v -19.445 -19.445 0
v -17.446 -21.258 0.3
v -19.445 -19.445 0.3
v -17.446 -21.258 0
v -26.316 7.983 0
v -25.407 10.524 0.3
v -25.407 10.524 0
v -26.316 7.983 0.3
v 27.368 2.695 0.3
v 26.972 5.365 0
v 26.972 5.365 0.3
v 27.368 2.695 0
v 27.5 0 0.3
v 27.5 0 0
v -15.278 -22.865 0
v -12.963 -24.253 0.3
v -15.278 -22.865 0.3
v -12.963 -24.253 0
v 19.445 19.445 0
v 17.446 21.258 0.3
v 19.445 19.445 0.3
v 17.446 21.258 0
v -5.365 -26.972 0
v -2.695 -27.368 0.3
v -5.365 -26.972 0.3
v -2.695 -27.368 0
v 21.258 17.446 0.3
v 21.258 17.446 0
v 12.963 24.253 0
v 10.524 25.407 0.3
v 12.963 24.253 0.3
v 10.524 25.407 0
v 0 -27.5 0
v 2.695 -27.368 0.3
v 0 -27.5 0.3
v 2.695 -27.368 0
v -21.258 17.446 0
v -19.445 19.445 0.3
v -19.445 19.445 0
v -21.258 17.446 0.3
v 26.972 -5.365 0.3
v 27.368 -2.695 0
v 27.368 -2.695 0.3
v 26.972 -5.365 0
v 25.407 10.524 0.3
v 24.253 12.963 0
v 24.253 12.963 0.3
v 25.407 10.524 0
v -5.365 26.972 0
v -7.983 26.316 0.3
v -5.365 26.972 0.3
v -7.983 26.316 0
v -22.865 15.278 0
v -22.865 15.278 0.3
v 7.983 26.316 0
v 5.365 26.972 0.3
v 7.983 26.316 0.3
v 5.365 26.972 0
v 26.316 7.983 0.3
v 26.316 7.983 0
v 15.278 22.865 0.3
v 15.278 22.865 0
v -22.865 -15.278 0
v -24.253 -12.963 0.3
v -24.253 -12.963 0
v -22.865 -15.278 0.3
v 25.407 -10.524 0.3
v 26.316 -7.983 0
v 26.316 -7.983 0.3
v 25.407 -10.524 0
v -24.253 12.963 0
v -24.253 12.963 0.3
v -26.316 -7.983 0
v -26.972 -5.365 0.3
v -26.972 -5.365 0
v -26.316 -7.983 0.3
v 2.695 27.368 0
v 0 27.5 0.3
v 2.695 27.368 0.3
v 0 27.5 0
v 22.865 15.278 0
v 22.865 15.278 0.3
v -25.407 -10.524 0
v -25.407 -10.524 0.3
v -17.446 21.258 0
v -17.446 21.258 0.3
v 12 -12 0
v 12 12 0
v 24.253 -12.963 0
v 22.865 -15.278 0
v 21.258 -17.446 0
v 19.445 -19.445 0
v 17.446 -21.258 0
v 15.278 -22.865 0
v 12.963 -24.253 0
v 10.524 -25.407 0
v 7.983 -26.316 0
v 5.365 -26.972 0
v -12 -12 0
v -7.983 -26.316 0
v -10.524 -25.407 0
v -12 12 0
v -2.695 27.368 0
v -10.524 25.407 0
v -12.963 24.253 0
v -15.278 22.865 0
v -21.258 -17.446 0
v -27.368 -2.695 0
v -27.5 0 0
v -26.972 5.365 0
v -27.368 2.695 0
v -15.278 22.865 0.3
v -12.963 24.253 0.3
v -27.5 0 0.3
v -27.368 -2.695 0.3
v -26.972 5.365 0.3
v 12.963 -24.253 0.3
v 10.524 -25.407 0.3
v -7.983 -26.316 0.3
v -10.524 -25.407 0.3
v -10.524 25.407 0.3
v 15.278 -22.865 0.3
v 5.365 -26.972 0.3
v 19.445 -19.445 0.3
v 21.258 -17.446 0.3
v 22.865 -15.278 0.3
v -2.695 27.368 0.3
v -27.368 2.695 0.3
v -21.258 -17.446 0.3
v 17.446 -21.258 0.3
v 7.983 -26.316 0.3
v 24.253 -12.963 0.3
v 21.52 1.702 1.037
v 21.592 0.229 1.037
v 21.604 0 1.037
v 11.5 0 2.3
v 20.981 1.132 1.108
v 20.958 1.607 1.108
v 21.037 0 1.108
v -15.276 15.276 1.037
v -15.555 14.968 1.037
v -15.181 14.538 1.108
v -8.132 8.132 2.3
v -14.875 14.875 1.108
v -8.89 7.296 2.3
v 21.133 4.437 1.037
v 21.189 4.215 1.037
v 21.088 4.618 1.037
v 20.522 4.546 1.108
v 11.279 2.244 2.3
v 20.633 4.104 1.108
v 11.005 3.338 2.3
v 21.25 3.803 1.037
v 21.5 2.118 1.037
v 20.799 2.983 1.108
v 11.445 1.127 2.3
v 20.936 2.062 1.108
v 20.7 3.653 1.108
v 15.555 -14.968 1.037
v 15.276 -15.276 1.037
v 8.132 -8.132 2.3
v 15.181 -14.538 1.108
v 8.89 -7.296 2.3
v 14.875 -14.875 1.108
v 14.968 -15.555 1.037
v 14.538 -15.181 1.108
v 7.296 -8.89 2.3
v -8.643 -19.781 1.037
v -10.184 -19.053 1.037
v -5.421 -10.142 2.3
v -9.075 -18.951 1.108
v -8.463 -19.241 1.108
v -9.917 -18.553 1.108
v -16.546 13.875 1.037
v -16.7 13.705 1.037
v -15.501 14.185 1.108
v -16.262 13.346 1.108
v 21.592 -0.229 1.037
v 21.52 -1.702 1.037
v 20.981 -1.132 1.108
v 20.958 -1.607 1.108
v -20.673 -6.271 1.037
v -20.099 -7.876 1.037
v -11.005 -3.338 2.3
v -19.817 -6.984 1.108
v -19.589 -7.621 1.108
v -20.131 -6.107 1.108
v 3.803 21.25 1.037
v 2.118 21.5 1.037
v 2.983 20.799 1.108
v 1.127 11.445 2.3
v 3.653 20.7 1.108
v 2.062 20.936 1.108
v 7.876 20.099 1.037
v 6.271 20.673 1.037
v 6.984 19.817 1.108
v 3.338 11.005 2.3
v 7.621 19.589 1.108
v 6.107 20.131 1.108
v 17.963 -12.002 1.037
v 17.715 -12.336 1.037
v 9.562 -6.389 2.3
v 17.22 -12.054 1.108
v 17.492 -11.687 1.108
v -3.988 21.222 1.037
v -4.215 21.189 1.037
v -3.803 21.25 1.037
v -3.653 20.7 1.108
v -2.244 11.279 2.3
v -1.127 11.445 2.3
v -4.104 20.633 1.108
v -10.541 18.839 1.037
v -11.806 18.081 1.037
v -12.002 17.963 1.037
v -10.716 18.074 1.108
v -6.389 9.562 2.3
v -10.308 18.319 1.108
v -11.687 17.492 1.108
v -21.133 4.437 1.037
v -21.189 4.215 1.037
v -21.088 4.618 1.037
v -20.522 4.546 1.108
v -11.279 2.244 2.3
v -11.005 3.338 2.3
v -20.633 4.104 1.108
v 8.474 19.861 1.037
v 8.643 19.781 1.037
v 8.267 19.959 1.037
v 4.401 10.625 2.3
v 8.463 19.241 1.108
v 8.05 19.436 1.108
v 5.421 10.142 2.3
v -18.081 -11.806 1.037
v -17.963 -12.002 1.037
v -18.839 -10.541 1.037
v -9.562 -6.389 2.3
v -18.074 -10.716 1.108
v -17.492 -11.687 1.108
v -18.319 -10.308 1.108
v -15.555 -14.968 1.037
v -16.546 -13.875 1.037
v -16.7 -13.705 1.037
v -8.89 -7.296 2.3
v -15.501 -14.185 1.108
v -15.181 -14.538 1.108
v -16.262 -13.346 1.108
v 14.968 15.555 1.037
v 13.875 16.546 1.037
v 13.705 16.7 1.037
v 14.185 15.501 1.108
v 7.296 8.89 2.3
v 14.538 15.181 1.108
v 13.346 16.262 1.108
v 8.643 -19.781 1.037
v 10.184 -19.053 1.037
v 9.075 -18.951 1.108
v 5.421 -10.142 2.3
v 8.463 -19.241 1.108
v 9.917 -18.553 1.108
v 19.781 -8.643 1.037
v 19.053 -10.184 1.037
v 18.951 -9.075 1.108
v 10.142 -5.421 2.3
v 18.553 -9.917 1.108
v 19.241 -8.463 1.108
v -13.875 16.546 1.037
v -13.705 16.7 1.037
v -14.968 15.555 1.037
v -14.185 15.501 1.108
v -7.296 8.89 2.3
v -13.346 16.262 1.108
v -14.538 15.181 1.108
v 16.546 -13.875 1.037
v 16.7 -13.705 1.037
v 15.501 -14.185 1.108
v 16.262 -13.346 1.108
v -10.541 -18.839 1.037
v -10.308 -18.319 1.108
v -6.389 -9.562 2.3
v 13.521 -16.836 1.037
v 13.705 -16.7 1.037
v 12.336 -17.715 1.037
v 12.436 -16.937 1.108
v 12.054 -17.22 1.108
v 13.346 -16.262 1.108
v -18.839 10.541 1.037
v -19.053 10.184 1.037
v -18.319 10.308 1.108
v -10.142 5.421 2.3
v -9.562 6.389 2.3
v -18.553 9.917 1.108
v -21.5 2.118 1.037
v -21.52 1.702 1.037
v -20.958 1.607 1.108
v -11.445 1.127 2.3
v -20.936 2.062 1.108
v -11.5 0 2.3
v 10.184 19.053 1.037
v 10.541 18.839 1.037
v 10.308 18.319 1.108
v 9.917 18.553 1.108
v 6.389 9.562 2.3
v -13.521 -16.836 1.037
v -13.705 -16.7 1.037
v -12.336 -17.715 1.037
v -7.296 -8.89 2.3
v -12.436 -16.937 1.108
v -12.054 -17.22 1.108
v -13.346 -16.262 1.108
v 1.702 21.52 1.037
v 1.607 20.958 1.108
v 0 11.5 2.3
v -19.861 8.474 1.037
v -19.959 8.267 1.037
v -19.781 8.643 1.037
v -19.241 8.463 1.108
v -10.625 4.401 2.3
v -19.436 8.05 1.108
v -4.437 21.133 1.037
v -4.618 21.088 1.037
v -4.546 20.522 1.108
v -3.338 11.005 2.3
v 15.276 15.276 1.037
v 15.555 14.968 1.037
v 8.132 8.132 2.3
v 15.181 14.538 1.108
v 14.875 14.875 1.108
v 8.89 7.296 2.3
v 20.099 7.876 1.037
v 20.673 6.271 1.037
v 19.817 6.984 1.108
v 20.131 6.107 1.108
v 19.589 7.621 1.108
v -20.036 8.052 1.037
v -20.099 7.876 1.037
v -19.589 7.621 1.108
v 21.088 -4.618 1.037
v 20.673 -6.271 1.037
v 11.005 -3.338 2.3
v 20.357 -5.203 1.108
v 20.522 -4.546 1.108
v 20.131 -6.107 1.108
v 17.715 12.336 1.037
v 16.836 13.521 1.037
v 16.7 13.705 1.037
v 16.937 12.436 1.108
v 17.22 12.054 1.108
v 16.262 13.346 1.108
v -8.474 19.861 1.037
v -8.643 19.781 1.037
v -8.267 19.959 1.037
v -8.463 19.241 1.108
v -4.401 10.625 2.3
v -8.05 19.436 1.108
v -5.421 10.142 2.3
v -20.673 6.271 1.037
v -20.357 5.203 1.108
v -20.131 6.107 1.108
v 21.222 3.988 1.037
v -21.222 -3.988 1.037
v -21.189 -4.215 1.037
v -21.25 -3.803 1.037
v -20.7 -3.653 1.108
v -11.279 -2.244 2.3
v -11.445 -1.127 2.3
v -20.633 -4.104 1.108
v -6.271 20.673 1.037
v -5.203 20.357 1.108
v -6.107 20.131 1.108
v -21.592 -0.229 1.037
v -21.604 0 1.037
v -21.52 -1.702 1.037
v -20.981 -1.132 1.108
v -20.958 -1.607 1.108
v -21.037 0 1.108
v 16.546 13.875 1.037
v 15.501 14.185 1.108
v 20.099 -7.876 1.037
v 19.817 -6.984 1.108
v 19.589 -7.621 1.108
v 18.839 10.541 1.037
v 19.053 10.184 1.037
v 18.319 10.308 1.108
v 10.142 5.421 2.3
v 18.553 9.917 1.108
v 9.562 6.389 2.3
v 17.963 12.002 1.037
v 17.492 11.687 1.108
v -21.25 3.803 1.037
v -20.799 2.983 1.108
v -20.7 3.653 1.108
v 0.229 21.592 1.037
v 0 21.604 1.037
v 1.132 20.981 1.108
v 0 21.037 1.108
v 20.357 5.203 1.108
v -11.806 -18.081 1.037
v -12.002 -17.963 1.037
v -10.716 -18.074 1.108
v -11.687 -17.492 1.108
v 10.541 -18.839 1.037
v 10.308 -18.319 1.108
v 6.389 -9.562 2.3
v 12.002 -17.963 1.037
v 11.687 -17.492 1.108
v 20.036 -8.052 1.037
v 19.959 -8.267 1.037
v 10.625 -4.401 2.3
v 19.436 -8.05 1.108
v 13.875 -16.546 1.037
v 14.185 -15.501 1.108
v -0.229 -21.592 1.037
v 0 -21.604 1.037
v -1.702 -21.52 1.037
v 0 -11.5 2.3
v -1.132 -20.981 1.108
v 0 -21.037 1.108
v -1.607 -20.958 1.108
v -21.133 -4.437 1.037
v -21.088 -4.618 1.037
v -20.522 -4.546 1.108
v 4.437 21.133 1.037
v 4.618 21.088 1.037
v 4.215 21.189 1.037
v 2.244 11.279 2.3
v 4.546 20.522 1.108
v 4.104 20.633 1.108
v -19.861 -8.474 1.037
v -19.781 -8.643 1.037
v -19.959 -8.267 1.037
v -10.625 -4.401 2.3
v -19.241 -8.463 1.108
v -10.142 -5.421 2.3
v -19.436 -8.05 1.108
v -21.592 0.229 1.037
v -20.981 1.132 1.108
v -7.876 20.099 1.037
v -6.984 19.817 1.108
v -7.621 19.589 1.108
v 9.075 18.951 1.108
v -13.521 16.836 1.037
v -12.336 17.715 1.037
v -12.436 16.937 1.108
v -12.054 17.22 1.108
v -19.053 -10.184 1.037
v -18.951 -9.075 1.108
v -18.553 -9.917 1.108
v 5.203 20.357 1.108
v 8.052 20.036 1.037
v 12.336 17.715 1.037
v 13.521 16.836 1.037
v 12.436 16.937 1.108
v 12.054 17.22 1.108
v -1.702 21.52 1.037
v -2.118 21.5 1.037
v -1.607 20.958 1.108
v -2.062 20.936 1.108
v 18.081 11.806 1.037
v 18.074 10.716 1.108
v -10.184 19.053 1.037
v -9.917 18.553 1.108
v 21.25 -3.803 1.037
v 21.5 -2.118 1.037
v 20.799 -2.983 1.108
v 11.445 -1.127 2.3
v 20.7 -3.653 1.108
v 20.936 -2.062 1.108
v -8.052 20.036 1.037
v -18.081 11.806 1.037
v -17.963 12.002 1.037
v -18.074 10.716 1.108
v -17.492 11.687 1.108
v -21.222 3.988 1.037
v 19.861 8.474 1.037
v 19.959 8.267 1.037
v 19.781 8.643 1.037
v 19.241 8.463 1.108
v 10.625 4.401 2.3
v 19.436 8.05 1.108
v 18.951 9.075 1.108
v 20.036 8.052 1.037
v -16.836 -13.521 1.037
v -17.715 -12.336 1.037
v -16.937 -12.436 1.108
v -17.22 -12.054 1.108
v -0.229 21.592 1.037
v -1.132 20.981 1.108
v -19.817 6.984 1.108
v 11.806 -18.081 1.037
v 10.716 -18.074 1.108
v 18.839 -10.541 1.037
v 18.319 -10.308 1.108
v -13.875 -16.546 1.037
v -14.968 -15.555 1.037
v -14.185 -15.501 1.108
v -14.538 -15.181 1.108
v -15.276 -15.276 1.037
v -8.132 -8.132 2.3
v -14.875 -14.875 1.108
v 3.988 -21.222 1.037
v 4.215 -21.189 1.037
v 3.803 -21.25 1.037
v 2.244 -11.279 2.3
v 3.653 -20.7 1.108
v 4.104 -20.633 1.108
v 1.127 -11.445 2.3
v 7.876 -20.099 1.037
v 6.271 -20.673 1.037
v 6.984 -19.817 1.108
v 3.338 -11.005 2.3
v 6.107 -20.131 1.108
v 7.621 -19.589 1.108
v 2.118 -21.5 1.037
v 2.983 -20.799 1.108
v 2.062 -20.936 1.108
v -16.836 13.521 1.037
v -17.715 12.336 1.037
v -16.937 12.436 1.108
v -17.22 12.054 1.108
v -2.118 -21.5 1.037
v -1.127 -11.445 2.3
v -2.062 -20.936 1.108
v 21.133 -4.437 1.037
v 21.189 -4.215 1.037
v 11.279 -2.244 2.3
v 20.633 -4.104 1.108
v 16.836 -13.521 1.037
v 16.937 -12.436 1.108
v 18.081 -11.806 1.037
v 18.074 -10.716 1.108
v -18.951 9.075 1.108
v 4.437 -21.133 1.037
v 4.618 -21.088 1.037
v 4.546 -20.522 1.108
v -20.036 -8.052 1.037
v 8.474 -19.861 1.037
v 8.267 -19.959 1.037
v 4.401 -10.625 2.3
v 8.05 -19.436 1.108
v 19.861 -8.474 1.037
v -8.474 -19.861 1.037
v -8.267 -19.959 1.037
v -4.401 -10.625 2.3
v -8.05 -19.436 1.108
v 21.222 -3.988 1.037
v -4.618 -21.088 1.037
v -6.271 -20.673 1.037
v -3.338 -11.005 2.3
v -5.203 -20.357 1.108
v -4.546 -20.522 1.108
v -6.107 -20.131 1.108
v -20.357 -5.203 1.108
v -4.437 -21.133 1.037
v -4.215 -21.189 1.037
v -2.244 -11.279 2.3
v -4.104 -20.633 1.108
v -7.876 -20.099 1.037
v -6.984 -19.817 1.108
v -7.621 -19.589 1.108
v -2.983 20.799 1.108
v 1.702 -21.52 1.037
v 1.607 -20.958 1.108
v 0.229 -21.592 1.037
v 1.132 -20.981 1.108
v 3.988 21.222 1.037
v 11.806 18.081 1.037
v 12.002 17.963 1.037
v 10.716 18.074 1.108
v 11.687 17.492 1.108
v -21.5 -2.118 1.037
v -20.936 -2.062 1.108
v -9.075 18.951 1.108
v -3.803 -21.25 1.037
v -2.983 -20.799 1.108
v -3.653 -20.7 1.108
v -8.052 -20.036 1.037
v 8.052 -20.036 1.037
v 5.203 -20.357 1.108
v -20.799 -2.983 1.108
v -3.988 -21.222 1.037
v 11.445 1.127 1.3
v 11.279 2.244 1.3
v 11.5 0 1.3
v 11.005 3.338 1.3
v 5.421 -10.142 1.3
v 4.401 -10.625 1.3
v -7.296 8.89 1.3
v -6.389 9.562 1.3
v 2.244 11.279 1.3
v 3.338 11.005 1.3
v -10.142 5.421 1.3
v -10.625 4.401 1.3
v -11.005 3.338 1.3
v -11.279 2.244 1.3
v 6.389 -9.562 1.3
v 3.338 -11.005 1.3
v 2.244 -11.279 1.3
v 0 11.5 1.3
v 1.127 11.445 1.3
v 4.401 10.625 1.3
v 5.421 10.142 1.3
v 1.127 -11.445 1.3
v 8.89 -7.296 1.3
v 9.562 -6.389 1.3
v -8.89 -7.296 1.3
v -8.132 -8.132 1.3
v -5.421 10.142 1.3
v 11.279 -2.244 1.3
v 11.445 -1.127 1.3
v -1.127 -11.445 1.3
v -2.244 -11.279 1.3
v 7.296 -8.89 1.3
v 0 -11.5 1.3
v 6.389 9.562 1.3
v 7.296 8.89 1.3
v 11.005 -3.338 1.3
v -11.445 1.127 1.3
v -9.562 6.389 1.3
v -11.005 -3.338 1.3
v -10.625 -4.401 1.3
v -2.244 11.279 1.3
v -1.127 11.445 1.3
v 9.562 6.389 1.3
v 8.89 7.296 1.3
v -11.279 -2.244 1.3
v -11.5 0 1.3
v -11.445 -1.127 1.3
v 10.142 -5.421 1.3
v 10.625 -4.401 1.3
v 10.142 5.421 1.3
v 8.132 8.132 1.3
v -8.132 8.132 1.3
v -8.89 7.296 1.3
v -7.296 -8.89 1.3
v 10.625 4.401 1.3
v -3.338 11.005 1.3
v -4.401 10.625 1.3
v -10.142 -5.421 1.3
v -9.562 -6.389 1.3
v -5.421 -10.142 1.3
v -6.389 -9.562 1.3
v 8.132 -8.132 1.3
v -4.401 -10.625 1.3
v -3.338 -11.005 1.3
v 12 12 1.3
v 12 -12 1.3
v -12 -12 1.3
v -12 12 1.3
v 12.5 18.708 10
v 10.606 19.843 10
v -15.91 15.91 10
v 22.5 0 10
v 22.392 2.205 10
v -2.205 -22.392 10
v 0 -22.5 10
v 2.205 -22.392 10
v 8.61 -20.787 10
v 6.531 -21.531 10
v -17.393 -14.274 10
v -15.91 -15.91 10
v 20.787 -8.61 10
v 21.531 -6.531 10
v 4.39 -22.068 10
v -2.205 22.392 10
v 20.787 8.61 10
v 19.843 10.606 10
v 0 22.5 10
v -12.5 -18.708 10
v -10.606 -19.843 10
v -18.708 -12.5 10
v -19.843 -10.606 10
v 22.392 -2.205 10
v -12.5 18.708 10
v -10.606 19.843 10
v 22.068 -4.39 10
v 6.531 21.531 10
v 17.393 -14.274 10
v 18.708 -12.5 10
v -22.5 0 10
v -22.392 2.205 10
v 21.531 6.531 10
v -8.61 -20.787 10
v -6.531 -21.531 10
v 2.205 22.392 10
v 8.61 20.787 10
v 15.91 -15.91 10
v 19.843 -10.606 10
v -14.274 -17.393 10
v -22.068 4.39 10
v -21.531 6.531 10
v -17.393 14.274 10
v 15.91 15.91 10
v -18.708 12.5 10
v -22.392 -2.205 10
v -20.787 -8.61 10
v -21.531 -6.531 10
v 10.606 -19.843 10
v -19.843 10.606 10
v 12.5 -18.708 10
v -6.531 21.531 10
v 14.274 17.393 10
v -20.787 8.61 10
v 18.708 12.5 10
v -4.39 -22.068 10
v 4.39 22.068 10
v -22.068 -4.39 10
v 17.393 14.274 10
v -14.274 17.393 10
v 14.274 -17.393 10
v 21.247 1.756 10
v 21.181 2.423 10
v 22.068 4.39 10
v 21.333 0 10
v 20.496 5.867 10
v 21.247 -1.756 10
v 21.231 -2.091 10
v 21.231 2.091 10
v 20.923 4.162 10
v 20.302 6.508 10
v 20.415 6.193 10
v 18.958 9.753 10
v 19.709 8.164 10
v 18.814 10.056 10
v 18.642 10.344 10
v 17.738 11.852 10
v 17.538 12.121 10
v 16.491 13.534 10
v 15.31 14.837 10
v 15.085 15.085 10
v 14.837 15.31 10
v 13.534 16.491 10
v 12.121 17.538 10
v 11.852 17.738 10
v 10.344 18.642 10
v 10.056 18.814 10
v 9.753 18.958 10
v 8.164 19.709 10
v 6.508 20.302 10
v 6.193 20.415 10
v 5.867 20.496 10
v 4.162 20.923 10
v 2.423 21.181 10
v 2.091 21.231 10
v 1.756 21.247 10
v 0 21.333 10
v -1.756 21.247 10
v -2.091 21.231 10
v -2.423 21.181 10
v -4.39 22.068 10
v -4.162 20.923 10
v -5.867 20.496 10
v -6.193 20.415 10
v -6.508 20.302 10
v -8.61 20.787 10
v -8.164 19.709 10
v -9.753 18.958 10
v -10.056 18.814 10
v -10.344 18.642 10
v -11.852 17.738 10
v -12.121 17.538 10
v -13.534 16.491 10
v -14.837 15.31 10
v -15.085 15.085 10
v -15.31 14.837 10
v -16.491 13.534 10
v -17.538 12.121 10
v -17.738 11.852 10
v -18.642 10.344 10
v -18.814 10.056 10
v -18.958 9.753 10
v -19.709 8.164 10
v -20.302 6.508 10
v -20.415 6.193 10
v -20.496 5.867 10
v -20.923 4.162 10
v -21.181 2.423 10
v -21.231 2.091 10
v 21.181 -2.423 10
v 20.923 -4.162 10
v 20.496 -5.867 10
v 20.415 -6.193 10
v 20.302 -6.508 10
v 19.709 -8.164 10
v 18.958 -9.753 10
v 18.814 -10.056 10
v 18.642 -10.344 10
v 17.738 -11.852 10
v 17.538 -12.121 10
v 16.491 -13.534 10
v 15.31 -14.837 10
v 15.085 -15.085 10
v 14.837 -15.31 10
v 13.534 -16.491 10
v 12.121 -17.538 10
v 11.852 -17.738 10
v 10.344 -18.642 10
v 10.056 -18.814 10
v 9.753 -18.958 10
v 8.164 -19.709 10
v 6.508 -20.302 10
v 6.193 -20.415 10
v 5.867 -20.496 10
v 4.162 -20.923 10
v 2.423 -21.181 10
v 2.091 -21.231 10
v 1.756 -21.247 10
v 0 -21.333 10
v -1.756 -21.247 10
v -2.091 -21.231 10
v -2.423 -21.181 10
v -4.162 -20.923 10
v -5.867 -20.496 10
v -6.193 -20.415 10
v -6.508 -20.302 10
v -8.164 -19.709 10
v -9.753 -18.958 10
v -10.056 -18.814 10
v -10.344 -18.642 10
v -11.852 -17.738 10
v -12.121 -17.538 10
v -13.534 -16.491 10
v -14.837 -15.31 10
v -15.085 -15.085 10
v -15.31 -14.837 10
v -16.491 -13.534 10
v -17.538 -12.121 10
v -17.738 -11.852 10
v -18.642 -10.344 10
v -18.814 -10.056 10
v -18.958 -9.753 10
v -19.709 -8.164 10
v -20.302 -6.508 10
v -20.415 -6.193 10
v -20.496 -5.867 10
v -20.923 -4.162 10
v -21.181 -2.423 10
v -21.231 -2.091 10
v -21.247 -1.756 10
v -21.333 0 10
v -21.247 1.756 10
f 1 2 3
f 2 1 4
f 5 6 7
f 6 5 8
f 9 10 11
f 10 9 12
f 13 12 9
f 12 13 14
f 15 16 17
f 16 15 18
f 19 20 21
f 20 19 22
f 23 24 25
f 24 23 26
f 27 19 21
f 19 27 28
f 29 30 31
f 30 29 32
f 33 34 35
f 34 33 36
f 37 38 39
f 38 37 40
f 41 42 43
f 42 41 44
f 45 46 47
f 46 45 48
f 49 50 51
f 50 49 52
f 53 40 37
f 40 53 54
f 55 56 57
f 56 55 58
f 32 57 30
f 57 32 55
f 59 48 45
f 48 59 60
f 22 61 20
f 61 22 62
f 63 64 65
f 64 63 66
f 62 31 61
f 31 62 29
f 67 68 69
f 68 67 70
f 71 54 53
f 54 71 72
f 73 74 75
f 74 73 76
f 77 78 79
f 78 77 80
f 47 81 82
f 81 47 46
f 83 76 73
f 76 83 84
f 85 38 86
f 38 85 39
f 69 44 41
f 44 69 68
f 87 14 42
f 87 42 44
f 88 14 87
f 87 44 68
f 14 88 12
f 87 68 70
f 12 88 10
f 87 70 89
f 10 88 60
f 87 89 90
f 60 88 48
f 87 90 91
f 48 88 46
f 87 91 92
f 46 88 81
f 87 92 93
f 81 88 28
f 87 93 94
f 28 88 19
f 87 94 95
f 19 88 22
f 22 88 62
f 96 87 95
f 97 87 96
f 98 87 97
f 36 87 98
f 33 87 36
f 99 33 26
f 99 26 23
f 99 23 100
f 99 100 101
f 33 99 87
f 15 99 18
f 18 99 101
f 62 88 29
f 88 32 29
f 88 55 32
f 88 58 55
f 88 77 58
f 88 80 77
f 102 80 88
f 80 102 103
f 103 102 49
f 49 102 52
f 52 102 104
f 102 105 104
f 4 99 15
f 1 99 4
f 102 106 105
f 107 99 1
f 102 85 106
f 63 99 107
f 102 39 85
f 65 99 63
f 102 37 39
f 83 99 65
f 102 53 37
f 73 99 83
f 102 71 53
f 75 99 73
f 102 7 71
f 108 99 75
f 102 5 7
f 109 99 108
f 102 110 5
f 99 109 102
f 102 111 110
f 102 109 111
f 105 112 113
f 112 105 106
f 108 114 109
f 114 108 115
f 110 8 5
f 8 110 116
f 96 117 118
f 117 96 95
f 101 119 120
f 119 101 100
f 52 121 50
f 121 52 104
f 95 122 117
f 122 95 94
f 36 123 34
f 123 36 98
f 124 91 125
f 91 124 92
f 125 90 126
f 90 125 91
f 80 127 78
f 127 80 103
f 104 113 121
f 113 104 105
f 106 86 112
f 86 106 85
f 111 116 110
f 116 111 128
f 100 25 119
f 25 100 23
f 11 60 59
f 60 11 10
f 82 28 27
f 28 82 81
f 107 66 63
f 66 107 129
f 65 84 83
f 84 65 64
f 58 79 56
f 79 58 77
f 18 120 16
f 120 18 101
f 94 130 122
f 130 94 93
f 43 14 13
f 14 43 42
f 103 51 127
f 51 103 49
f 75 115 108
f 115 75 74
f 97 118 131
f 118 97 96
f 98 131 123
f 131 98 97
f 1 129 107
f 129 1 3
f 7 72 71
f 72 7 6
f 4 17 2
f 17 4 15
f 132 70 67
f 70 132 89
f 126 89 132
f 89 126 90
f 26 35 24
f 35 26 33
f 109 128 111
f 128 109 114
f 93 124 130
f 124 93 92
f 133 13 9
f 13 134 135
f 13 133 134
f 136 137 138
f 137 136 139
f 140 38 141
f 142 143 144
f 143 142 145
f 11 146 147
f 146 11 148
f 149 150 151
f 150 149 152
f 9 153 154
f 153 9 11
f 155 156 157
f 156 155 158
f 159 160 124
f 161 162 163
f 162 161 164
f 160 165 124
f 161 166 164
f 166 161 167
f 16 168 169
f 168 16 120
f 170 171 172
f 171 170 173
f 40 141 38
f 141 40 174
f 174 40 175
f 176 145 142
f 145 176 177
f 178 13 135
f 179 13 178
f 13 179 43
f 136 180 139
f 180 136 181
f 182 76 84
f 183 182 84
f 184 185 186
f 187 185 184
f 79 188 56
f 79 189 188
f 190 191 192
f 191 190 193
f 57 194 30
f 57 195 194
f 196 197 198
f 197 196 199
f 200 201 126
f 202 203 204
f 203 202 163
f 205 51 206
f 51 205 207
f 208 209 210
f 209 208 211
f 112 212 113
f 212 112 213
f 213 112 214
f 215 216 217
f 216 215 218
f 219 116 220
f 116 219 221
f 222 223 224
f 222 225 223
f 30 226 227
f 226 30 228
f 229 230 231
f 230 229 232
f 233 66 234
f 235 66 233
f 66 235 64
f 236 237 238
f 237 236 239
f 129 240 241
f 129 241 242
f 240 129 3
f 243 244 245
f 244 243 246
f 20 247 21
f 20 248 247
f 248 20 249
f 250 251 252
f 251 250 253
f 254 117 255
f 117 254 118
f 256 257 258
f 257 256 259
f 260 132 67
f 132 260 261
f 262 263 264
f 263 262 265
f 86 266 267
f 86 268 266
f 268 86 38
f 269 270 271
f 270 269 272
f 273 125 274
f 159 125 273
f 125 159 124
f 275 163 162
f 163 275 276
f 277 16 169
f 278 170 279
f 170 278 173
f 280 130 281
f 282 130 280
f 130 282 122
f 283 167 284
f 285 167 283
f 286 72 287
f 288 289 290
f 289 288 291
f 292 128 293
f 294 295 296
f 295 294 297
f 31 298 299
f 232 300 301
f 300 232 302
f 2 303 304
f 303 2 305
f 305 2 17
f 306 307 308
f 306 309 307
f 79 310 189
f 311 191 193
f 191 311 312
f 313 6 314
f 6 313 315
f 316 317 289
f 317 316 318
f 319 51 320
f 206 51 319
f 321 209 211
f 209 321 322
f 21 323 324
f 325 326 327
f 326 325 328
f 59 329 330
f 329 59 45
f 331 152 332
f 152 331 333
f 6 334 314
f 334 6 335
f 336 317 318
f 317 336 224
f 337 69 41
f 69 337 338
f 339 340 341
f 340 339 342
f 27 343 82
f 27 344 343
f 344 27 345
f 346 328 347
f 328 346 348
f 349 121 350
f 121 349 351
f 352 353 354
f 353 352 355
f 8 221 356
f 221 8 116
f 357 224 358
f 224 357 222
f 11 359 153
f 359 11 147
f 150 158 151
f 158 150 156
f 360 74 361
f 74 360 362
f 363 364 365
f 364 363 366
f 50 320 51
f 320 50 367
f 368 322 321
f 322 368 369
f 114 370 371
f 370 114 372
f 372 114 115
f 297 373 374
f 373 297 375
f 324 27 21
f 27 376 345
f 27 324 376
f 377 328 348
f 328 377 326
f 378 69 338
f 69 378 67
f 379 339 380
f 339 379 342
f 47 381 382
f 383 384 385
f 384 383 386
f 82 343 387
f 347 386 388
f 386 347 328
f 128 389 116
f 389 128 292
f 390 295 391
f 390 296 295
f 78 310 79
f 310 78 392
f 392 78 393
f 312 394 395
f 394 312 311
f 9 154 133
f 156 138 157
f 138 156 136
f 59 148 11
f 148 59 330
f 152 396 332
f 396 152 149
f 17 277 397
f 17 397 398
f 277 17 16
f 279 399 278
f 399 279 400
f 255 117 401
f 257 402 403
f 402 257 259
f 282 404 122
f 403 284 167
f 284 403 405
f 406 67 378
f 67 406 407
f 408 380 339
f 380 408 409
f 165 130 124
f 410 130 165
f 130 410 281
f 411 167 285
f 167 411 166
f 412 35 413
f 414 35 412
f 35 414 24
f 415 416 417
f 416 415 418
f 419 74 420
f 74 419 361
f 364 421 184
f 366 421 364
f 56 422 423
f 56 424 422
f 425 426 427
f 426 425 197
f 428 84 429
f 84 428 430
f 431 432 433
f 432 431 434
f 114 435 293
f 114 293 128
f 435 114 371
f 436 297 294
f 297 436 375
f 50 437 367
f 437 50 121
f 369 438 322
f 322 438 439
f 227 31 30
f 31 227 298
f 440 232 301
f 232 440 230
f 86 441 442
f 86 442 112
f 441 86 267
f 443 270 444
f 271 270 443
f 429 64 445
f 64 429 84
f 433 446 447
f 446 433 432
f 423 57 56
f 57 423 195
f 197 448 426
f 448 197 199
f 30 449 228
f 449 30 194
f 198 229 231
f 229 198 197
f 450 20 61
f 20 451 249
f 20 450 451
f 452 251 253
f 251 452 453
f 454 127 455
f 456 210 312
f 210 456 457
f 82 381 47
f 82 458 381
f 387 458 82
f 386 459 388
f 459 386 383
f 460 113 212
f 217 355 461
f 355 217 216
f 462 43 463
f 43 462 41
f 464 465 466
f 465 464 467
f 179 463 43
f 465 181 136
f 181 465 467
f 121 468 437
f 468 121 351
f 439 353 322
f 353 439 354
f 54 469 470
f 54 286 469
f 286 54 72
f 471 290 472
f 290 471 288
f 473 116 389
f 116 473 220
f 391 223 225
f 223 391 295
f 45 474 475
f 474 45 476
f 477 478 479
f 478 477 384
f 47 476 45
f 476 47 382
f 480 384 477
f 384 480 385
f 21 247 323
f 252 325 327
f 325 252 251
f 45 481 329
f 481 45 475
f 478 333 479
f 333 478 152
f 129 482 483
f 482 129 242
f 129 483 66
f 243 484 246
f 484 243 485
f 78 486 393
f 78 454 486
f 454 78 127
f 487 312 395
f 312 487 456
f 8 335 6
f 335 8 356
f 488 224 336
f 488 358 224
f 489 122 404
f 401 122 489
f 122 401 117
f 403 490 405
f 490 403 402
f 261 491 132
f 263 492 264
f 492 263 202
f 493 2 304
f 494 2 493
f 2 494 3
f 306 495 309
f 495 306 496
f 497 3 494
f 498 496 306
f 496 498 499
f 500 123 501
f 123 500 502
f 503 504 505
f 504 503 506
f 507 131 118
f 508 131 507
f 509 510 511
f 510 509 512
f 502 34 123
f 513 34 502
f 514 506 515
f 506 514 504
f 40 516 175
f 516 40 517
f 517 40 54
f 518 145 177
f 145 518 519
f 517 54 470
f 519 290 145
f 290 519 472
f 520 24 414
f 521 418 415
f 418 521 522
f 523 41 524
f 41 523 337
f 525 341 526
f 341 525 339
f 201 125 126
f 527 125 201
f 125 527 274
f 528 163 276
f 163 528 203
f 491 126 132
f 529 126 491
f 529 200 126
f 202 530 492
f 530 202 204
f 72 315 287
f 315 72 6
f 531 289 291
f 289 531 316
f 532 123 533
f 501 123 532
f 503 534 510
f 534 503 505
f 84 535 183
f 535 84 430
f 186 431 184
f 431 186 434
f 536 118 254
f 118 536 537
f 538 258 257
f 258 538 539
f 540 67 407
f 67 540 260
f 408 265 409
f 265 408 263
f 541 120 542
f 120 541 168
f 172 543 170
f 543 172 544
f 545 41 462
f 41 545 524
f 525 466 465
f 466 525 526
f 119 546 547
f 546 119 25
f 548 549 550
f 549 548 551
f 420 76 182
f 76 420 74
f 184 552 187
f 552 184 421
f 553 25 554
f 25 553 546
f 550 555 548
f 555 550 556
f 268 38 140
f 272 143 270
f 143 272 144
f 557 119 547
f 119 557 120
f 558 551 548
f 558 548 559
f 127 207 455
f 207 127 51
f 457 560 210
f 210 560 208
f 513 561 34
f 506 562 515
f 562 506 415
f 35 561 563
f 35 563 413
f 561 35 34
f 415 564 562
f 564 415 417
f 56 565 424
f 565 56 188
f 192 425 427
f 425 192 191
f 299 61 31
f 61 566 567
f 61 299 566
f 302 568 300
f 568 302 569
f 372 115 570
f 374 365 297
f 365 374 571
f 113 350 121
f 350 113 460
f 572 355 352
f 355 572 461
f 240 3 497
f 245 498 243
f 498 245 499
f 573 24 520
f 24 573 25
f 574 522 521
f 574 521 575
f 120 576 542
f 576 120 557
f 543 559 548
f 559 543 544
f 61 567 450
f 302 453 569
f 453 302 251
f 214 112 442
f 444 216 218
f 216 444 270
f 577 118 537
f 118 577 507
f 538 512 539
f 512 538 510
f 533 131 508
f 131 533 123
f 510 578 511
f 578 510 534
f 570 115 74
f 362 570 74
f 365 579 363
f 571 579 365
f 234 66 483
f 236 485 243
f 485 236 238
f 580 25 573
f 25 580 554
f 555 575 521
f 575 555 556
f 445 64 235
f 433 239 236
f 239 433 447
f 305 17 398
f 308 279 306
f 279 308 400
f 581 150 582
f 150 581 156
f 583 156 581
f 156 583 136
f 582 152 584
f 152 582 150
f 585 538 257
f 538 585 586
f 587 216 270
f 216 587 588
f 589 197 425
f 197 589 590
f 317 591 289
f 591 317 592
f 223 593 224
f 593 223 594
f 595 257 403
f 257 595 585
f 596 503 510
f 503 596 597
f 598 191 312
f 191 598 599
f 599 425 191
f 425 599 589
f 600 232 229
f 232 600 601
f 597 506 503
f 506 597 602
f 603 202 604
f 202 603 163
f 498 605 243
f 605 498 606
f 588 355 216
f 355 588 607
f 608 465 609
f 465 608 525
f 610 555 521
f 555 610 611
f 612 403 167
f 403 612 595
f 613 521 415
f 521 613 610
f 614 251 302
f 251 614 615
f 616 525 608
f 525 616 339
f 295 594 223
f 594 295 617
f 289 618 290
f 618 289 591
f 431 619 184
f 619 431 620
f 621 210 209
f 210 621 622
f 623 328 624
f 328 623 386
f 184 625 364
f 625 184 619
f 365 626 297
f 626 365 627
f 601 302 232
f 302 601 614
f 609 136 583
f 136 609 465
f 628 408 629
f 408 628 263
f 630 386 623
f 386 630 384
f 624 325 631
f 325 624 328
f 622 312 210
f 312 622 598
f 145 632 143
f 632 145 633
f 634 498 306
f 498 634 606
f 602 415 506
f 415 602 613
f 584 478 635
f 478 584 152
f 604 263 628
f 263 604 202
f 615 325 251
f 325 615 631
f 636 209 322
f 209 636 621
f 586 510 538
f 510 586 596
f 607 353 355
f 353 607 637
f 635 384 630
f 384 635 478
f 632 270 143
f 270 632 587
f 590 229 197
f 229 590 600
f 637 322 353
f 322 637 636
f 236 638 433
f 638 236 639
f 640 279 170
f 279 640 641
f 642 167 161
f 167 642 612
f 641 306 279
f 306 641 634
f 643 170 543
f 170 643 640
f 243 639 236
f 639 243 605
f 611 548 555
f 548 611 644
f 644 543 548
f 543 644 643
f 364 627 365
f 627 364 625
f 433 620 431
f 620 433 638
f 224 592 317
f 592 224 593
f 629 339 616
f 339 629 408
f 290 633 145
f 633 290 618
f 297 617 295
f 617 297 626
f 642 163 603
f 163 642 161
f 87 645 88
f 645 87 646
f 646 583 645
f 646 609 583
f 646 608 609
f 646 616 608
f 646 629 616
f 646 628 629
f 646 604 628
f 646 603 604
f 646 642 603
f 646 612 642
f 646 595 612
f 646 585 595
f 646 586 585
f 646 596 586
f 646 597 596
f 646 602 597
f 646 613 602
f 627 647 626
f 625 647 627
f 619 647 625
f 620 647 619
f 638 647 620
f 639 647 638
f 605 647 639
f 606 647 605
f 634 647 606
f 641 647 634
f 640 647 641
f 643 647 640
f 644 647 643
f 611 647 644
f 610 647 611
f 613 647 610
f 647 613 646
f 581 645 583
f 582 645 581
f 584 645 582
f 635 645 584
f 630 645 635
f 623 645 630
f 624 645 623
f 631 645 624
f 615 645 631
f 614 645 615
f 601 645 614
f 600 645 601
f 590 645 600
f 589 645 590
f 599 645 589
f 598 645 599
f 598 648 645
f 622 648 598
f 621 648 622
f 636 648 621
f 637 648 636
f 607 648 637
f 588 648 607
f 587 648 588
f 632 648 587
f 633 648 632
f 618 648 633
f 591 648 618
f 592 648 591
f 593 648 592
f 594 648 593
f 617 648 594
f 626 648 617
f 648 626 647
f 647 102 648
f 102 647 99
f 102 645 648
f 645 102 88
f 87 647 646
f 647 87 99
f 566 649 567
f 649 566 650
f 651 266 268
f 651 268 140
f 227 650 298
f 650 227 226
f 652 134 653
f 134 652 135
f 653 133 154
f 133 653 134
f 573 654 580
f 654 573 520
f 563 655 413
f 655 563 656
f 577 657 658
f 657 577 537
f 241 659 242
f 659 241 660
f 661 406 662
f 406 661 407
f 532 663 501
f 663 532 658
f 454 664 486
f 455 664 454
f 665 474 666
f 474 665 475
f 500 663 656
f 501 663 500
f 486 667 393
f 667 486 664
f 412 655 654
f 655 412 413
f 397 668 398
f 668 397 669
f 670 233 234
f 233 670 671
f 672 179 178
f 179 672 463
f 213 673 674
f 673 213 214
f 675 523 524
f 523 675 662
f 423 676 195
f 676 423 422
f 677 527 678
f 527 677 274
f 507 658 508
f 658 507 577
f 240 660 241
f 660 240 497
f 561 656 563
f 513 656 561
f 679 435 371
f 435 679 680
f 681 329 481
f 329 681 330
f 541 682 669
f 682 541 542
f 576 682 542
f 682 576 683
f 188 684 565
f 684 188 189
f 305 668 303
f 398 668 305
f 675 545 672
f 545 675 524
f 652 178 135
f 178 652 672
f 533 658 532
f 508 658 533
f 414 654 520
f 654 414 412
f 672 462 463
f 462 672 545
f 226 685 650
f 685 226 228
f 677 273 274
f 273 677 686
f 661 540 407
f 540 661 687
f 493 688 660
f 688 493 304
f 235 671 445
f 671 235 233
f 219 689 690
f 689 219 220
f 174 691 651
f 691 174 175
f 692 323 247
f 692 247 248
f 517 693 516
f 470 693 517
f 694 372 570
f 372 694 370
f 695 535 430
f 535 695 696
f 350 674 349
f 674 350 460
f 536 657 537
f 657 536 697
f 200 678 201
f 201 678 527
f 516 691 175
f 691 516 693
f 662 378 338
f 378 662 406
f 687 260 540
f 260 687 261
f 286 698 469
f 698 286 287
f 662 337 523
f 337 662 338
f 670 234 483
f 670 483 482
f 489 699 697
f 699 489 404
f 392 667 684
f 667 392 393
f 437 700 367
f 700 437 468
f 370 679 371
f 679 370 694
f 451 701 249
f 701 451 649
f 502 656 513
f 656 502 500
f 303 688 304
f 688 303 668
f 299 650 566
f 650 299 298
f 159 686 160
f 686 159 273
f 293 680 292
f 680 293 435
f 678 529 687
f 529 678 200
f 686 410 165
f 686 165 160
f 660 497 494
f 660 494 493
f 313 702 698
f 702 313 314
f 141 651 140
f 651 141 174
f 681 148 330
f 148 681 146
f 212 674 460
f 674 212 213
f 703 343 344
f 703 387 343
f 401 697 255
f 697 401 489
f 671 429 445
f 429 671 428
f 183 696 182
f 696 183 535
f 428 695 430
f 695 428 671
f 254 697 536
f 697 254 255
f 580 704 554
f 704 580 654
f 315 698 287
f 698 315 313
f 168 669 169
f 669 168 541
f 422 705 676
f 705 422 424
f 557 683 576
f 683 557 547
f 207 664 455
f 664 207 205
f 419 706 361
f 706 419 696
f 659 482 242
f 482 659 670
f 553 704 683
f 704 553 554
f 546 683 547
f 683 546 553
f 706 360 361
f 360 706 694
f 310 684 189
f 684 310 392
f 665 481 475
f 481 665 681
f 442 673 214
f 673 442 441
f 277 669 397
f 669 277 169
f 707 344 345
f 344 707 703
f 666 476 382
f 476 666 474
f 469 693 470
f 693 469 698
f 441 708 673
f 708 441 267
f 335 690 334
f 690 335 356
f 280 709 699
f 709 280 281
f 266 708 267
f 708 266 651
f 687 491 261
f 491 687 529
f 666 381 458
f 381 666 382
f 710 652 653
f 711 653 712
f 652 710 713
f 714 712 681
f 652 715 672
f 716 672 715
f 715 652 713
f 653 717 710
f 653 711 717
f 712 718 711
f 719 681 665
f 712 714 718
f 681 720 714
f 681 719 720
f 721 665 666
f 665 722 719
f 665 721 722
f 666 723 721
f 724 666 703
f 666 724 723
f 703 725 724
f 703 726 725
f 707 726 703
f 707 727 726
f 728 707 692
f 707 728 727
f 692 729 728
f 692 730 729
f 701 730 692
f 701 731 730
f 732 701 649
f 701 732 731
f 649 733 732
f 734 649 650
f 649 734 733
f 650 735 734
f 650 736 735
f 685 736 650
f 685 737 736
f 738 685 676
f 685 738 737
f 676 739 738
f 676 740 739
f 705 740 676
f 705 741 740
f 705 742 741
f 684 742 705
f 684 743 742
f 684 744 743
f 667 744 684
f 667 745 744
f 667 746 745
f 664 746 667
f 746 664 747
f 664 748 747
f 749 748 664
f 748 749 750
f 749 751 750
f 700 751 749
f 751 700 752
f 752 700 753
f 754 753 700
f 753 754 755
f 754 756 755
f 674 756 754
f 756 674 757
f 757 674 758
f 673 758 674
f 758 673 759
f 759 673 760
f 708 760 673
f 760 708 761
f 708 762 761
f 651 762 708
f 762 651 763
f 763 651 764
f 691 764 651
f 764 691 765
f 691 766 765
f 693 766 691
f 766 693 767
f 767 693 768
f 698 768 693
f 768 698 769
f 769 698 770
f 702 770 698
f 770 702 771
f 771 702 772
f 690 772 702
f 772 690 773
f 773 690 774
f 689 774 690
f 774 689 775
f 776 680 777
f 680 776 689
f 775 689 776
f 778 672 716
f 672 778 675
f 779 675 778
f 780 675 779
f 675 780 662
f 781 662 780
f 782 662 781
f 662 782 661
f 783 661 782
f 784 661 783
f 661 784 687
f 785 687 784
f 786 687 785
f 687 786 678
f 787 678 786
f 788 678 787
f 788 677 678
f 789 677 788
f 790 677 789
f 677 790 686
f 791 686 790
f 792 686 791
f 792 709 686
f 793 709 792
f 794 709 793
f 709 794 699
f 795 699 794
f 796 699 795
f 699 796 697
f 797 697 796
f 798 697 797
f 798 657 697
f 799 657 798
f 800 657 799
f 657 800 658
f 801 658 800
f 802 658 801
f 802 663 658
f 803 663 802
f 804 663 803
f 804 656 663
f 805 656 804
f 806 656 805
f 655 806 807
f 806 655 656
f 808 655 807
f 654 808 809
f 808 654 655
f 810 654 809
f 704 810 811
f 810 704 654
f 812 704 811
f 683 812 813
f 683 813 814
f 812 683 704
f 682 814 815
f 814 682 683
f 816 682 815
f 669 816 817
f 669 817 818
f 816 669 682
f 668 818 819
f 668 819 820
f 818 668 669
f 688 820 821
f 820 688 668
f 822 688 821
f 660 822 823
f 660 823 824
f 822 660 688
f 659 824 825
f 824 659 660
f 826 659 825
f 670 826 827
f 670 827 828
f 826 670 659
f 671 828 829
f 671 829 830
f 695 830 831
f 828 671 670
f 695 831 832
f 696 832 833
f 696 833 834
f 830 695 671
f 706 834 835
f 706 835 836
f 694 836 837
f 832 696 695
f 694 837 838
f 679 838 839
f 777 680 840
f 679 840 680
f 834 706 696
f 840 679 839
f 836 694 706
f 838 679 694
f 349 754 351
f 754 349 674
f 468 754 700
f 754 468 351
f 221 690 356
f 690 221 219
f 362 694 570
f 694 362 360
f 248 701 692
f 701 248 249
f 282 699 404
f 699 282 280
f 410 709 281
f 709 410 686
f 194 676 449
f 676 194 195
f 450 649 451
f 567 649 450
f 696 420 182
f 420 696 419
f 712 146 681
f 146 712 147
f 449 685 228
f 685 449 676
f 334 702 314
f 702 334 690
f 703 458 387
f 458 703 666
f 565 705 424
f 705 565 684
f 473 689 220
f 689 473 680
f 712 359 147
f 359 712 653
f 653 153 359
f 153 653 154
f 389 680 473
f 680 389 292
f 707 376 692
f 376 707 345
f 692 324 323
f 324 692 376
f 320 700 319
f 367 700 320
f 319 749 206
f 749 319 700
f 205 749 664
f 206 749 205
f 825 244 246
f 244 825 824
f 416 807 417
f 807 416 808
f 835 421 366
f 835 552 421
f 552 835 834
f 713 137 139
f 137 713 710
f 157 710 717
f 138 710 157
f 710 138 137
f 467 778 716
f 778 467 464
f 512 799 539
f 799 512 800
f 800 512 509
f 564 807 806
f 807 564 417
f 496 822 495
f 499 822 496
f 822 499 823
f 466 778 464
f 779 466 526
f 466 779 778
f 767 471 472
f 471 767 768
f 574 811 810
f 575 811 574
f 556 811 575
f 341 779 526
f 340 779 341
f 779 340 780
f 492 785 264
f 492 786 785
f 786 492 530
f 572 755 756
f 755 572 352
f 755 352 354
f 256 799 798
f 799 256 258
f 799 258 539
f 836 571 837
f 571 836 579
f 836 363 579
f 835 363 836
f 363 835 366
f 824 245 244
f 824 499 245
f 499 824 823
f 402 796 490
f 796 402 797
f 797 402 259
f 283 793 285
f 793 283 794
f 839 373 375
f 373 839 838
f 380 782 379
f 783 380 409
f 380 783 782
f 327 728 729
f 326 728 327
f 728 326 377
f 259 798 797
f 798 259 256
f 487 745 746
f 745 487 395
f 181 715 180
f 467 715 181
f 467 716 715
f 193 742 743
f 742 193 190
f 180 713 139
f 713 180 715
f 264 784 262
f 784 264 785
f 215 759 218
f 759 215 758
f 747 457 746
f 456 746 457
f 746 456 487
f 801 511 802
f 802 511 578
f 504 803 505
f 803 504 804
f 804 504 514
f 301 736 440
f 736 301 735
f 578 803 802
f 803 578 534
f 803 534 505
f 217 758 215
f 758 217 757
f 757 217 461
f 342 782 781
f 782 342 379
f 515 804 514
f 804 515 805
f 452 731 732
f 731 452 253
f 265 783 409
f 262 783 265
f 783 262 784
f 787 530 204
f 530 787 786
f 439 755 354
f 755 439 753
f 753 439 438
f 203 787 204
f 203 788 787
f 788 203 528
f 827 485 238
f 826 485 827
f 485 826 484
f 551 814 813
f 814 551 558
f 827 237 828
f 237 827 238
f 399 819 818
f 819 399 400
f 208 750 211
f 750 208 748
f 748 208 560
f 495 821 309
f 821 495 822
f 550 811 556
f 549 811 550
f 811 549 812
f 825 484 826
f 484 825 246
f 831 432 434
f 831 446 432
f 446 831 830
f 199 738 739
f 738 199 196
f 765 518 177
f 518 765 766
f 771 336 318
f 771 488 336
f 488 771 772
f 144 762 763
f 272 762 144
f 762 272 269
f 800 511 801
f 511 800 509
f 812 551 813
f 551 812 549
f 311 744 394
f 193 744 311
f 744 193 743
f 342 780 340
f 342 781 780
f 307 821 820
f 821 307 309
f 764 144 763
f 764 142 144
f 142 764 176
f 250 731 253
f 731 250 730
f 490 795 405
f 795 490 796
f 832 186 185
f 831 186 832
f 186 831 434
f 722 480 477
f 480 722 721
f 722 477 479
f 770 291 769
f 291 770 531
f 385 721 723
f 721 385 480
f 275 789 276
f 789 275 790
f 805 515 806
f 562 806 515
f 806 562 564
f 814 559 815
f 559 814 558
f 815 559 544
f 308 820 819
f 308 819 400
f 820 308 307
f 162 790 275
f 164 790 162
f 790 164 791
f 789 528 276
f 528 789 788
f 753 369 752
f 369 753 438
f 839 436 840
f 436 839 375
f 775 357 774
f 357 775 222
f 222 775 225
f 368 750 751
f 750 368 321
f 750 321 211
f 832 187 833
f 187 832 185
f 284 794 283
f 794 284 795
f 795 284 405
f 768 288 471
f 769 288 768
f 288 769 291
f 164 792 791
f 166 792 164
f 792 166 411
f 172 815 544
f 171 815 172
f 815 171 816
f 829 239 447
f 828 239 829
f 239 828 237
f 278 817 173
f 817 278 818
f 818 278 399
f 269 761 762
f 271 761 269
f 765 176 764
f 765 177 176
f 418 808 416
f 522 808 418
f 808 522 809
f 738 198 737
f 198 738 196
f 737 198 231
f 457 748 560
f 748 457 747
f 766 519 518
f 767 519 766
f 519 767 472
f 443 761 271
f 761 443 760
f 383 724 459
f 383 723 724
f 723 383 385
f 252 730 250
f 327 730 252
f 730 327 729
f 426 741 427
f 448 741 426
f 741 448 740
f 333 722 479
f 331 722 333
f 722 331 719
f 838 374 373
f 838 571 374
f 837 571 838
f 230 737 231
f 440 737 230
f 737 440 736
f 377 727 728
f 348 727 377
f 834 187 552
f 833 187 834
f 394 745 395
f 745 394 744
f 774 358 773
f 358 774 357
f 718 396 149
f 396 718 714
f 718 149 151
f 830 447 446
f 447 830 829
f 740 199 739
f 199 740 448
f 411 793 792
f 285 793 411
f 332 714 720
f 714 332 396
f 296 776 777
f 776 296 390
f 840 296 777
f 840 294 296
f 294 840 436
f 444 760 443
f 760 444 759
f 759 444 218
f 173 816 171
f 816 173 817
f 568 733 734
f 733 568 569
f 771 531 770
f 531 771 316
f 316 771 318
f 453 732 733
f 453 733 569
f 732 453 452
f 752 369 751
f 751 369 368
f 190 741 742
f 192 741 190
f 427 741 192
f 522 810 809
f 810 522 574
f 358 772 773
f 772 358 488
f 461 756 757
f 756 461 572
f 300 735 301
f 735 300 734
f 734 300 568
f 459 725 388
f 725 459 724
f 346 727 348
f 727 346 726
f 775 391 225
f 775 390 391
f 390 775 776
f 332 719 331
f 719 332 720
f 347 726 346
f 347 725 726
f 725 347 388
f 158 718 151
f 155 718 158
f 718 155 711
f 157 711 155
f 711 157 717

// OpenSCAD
$fn=64;

W=33;
H=25;
C_DIA=23;
C_W=24;
C_H=1;

HOLE_D=44;
COVER_D=55;

module upperPart() {
    
    H1=.3;
    H2=2;
    difference() {
        union() {
            cylinder(d=COVER_D,h=H1);
            translate([0,0,H1])
            cylinder(d1=COVER_D,d2=C_DIA,h=H2);
        }
        cylinder(d=C_DIA,h=30,center=true);
        cube([C_W,C_W,(H1+H2)*2-H2],center=true);

//        cylinder(   d=HOLE_D );
        
    }
    
}

module     bottomPart() {

    difference() {
        cylinder(    d1=HOLE_D-1,d2=HOLE_D+1,h=10);
        cylinder(    d1=HOLE_D-2-1,d2=HOLE_D-2+1,center=true,h=30);
    }
}

mode="preview";

if(mode=="preview") {
    upperPart();
    bottomPart();
}

if(mode=="upper") {
    upperPart();
}
